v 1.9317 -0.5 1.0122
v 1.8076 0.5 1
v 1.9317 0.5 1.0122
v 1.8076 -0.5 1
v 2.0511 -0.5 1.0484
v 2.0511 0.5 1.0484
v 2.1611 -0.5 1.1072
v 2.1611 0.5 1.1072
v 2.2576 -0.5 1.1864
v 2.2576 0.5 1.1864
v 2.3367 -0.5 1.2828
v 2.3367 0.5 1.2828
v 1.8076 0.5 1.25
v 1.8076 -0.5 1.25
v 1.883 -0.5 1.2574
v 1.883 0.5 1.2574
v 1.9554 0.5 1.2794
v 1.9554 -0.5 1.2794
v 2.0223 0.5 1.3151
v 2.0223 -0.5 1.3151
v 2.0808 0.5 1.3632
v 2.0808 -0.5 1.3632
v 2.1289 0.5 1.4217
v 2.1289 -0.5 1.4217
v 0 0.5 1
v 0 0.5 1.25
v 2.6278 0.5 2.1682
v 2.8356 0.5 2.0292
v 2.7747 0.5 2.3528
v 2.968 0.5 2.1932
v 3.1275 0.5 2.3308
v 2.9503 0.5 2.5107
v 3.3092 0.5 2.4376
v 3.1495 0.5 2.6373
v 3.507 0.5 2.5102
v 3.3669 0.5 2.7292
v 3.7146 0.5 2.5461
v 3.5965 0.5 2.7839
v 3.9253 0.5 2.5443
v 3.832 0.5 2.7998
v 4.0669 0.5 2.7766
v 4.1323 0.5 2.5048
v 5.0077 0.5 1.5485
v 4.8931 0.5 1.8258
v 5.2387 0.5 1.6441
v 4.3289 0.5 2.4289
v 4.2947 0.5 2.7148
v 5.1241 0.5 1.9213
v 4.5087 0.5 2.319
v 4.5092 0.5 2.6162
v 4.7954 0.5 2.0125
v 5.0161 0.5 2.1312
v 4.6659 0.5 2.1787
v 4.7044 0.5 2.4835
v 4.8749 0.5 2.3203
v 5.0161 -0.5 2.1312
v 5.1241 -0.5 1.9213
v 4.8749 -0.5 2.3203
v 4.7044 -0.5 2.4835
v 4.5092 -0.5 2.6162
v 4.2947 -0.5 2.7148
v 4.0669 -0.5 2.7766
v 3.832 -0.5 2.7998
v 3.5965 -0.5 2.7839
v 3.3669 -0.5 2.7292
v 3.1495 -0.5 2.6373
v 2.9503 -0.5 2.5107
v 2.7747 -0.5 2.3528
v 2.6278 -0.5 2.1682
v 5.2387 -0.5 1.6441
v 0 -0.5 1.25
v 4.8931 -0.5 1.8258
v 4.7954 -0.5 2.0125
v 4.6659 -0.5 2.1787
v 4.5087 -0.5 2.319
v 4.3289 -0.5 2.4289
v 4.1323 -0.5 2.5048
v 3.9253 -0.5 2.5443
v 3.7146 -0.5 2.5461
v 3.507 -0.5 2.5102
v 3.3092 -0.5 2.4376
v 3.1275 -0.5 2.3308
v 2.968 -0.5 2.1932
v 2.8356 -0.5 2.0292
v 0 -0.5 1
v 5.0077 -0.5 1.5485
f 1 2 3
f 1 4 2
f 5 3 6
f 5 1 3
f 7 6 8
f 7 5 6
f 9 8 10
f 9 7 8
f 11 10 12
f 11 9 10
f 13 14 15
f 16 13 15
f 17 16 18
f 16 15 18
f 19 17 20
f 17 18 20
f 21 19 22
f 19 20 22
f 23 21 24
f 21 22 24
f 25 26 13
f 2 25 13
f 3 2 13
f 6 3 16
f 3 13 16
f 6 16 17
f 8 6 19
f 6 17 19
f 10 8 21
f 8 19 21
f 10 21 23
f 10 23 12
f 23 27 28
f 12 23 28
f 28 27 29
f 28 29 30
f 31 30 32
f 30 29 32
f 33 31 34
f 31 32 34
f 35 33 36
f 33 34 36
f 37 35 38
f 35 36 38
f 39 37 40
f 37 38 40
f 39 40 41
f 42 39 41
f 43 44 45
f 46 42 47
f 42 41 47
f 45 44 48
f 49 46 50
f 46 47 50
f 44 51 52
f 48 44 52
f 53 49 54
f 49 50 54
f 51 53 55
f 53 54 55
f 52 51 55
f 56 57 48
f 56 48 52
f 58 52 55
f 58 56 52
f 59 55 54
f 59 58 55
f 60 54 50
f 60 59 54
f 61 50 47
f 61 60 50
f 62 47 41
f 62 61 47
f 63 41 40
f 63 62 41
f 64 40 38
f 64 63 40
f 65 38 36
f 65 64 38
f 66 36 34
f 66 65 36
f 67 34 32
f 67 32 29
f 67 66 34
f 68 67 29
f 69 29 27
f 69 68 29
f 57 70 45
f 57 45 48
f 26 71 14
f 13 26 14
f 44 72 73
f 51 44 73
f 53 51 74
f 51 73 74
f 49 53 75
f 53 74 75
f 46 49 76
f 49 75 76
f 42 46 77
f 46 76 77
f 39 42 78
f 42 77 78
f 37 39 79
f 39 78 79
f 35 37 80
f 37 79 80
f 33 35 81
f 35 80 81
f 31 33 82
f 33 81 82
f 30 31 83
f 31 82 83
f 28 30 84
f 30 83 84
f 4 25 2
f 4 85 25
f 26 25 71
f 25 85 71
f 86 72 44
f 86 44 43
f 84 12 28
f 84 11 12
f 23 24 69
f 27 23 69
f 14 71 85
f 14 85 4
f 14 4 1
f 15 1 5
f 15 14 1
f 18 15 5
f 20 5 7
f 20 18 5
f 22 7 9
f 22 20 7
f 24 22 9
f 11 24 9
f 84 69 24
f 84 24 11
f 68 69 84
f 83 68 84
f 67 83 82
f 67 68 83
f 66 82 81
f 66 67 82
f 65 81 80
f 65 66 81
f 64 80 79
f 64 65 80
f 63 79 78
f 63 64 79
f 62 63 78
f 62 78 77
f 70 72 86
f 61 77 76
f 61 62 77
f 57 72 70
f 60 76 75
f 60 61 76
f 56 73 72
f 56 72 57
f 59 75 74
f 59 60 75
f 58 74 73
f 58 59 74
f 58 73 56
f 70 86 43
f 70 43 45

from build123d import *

# Parameters (mm, degrees)
PAD_DEPTH = 0.5


with BuildPart() as part:
    # Sketch → Pad (new body, symmetric)
    with BuildSketch(Plane.XZ):
        with BuildLine():
            Line((2.336739, 1.282811), (2.835603, 2.029241))
            ThreePointArc((4.893073, 1.825782), (3.925332, 2.544311), (2.835603, 2.029241))
            Line((4.893073, 1.825782), (5.00769, 1.548541))
            Line((5.00769, 1.548541), (5.238725, 1.644055))
            Line((5.238725, 1.644055), (5.124108, 1.921297))
            ThreePointArc((5.124108, 1.921297), (3.949934, 2.793098), (2.627751, 2.168156))
            Line((2.128886, 1.421726), (2.627751, 2.168156))
            ThreePointArc((1.807568, 1.25), (1.989732, 1.295625), (2.128886, 1.421726))
            Line((0, 1.25), (1.807568, 1.25))
            Line((0, 1), (0, 1.25))
            Line((0, 1), (1.807568, 1))
            ThreePointArc((1.807568, 1), (2.10757, 1.075138), (2.336739, 1.282811))
        make_face()
    extrude(amount=PAD_DEPTH, both=True)


solid = part.part
